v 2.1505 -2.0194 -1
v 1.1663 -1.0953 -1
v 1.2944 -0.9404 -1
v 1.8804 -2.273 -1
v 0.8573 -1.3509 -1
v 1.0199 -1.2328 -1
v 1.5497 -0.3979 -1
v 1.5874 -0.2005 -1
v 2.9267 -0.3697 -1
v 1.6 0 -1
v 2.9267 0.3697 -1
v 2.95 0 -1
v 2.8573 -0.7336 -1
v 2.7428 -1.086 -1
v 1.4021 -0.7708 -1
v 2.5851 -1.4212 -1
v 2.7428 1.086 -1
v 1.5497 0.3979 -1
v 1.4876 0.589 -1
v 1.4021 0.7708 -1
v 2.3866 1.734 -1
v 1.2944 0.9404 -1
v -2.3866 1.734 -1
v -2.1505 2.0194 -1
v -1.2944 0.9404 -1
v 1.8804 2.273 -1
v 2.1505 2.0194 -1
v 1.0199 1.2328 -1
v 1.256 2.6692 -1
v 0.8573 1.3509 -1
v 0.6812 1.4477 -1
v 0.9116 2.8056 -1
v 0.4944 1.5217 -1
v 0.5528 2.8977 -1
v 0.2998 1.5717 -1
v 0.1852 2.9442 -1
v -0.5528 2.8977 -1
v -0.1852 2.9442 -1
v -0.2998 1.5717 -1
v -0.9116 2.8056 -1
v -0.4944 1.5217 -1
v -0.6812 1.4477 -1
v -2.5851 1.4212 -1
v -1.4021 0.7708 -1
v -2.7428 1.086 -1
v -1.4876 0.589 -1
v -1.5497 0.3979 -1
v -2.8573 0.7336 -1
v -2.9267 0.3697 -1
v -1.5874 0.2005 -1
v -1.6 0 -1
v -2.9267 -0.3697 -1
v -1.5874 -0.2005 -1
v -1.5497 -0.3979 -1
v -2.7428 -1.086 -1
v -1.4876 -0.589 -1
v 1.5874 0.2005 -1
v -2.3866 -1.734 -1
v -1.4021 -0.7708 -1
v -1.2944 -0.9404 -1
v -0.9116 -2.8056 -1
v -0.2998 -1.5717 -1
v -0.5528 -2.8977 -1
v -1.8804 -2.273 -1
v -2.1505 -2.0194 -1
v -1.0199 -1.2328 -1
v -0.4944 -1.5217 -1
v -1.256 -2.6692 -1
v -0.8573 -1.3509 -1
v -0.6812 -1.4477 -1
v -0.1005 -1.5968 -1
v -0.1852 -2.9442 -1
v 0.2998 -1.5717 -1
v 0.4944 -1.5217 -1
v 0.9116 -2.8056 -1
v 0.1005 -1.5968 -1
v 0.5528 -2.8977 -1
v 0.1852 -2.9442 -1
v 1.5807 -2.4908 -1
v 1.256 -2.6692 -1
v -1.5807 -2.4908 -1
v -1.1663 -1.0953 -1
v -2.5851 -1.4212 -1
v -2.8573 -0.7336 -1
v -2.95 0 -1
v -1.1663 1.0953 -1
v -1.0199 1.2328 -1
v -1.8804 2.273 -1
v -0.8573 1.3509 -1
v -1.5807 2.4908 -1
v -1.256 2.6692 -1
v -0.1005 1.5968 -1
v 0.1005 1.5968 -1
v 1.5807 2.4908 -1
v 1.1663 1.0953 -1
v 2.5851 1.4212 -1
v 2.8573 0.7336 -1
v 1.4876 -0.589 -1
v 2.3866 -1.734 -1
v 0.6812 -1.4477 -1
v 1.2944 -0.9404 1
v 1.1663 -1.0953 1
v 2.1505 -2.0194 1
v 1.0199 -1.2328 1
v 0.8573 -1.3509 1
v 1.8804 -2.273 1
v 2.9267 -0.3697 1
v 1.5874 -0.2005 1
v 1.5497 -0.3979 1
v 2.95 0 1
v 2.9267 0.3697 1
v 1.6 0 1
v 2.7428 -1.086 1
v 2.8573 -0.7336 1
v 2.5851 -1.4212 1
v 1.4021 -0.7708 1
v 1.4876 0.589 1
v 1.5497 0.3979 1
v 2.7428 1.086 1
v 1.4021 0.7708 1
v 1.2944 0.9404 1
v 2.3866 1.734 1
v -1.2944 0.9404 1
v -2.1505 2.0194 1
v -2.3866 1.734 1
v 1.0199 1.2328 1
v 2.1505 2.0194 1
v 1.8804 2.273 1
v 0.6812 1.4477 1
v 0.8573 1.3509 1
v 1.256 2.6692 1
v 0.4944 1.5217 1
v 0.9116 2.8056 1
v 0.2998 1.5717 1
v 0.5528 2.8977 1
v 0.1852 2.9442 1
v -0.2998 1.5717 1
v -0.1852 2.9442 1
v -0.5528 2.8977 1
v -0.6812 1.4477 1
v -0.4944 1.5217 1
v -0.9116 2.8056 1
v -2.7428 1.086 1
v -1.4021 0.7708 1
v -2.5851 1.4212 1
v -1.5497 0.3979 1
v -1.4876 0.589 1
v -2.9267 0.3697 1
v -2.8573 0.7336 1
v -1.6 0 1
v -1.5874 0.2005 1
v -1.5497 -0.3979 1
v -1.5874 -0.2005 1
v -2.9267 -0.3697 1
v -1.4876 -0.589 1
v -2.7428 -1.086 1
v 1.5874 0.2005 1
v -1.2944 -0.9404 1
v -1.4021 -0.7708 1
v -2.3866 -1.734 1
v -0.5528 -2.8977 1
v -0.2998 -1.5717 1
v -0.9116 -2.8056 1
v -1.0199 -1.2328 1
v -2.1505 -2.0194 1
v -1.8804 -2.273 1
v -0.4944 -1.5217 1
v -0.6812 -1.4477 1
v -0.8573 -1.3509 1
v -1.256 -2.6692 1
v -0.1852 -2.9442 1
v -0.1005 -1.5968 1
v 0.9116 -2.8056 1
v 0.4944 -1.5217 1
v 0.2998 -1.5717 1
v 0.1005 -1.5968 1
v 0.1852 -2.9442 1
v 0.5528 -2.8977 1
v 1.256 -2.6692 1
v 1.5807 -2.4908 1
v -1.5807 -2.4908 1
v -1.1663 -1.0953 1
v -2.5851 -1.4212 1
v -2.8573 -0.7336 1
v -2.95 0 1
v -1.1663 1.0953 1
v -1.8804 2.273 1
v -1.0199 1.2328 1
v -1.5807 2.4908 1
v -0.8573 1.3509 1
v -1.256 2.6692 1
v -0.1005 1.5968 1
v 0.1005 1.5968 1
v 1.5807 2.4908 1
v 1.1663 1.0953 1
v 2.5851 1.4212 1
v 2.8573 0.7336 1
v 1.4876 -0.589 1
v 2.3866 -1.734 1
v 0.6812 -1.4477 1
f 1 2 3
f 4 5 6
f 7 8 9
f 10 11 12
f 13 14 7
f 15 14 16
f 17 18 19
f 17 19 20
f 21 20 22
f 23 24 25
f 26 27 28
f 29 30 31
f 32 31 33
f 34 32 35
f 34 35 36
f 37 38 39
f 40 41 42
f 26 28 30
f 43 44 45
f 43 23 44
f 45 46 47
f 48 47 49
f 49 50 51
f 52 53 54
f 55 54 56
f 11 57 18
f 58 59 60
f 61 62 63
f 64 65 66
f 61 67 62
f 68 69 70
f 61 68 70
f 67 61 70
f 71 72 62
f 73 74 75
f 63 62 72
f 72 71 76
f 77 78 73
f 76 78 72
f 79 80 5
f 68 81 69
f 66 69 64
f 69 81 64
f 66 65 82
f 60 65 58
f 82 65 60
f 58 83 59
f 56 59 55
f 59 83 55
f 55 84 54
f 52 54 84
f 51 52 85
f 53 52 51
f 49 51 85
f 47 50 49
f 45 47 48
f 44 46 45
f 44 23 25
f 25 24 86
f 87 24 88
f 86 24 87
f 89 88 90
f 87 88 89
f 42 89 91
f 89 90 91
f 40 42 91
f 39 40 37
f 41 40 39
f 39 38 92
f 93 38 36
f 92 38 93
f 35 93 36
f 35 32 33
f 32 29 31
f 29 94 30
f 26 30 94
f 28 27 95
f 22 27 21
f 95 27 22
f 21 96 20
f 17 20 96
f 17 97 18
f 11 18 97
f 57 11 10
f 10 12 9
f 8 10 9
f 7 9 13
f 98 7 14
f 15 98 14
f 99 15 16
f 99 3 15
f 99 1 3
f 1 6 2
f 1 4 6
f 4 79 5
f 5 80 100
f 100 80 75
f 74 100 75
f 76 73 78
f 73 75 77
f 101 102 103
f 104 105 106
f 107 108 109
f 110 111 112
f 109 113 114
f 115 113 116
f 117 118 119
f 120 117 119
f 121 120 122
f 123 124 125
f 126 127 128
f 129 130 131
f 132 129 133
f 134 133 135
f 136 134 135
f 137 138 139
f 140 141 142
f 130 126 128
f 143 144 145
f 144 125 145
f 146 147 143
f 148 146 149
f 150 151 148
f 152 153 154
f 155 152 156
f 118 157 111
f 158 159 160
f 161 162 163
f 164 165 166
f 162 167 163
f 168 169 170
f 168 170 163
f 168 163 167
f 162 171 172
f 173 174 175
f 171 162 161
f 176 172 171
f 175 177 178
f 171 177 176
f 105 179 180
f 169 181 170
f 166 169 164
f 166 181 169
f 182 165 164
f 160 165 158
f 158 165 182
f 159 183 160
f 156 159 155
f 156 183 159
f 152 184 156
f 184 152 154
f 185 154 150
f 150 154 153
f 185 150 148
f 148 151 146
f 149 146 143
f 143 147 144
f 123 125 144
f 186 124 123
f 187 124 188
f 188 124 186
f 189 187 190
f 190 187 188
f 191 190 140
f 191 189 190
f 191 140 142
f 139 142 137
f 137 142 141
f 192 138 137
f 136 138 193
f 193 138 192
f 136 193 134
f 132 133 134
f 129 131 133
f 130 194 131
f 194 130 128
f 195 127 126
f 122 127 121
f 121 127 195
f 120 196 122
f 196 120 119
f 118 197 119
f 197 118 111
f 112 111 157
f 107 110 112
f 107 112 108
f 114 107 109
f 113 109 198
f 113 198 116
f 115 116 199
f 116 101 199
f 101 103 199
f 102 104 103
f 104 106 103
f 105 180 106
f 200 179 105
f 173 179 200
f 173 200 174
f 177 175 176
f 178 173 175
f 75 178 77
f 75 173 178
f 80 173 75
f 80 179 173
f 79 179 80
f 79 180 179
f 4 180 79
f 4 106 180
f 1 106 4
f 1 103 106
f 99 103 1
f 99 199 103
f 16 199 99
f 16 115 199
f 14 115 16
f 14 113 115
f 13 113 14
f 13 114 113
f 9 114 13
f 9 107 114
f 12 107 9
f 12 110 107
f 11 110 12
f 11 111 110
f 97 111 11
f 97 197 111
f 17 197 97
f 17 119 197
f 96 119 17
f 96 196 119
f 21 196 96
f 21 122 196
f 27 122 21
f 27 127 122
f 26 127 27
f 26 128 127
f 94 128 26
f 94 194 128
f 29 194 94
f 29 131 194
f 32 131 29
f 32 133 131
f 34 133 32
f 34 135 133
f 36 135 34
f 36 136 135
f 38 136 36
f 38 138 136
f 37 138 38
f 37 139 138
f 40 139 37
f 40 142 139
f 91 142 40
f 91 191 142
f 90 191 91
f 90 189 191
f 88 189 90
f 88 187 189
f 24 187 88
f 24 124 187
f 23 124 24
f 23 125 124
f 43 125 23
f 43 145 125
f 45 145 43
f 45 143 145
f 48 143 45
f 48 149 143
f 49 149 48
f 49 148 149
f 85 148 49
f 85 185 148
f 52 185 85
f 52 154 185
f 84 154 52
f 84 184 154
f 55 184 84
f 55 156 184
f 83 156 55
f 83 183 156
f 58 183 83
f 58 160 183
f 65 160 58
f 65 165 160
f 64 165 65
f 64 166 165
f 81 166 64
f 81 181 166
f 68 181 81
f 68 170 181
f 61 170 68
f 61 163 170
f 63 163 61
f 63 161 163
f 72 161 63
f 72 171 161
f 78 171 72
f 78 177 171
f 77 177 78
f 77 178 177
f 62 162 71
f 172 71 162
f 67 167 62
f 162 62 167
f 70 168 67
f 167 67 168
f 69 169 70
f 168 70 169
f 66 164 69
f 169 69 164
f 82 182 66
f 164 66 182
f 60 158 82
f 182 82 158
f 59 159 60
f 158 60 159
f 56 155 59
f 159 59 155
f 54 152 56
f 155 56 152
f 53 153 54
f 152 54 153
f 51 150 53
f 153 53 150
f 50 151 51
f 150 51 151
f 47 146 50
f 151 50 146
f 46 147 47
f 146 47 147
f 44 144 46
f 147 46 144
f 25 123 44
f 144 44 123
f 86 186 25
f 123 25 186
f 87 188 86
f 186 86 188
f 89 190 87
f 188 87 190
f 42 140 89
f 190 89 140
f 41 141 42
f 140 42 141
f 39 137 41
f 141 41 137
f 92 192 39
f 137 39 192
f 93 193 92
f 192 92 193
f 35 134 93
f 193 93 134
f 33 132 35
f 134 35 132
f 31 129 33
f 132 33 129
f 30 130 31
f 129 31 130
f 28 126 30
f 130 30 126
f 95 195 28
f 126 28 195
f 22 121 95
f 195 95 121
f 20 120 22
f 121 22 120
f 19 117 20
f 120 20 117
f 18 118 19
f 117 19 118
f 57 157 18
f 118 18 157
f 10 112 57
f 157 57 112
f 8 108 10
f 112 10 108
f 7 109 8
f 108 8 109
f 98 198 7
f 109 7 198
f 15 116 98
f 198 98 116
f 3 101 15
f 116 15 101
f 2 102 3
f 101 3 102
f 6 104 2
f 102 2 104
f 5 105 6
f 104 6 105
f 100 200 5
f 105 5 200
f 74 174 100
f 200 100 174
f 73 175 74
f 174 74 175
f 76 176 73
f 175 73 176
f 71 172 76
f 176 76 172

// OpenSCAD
// file: pcb_mount.2d.scad
module pcb_mount() {
  difference() {
    circle(d=5.9, $fn=50);
    circle(d=3.2, $fn=50);
  }
}

pcb_mount();
// main file
use <pcb_mount.2d.scad>;

linear_extrude(height = 2, center = true, convexity = 10, twist = 0) {
  pcb_mount();
}
